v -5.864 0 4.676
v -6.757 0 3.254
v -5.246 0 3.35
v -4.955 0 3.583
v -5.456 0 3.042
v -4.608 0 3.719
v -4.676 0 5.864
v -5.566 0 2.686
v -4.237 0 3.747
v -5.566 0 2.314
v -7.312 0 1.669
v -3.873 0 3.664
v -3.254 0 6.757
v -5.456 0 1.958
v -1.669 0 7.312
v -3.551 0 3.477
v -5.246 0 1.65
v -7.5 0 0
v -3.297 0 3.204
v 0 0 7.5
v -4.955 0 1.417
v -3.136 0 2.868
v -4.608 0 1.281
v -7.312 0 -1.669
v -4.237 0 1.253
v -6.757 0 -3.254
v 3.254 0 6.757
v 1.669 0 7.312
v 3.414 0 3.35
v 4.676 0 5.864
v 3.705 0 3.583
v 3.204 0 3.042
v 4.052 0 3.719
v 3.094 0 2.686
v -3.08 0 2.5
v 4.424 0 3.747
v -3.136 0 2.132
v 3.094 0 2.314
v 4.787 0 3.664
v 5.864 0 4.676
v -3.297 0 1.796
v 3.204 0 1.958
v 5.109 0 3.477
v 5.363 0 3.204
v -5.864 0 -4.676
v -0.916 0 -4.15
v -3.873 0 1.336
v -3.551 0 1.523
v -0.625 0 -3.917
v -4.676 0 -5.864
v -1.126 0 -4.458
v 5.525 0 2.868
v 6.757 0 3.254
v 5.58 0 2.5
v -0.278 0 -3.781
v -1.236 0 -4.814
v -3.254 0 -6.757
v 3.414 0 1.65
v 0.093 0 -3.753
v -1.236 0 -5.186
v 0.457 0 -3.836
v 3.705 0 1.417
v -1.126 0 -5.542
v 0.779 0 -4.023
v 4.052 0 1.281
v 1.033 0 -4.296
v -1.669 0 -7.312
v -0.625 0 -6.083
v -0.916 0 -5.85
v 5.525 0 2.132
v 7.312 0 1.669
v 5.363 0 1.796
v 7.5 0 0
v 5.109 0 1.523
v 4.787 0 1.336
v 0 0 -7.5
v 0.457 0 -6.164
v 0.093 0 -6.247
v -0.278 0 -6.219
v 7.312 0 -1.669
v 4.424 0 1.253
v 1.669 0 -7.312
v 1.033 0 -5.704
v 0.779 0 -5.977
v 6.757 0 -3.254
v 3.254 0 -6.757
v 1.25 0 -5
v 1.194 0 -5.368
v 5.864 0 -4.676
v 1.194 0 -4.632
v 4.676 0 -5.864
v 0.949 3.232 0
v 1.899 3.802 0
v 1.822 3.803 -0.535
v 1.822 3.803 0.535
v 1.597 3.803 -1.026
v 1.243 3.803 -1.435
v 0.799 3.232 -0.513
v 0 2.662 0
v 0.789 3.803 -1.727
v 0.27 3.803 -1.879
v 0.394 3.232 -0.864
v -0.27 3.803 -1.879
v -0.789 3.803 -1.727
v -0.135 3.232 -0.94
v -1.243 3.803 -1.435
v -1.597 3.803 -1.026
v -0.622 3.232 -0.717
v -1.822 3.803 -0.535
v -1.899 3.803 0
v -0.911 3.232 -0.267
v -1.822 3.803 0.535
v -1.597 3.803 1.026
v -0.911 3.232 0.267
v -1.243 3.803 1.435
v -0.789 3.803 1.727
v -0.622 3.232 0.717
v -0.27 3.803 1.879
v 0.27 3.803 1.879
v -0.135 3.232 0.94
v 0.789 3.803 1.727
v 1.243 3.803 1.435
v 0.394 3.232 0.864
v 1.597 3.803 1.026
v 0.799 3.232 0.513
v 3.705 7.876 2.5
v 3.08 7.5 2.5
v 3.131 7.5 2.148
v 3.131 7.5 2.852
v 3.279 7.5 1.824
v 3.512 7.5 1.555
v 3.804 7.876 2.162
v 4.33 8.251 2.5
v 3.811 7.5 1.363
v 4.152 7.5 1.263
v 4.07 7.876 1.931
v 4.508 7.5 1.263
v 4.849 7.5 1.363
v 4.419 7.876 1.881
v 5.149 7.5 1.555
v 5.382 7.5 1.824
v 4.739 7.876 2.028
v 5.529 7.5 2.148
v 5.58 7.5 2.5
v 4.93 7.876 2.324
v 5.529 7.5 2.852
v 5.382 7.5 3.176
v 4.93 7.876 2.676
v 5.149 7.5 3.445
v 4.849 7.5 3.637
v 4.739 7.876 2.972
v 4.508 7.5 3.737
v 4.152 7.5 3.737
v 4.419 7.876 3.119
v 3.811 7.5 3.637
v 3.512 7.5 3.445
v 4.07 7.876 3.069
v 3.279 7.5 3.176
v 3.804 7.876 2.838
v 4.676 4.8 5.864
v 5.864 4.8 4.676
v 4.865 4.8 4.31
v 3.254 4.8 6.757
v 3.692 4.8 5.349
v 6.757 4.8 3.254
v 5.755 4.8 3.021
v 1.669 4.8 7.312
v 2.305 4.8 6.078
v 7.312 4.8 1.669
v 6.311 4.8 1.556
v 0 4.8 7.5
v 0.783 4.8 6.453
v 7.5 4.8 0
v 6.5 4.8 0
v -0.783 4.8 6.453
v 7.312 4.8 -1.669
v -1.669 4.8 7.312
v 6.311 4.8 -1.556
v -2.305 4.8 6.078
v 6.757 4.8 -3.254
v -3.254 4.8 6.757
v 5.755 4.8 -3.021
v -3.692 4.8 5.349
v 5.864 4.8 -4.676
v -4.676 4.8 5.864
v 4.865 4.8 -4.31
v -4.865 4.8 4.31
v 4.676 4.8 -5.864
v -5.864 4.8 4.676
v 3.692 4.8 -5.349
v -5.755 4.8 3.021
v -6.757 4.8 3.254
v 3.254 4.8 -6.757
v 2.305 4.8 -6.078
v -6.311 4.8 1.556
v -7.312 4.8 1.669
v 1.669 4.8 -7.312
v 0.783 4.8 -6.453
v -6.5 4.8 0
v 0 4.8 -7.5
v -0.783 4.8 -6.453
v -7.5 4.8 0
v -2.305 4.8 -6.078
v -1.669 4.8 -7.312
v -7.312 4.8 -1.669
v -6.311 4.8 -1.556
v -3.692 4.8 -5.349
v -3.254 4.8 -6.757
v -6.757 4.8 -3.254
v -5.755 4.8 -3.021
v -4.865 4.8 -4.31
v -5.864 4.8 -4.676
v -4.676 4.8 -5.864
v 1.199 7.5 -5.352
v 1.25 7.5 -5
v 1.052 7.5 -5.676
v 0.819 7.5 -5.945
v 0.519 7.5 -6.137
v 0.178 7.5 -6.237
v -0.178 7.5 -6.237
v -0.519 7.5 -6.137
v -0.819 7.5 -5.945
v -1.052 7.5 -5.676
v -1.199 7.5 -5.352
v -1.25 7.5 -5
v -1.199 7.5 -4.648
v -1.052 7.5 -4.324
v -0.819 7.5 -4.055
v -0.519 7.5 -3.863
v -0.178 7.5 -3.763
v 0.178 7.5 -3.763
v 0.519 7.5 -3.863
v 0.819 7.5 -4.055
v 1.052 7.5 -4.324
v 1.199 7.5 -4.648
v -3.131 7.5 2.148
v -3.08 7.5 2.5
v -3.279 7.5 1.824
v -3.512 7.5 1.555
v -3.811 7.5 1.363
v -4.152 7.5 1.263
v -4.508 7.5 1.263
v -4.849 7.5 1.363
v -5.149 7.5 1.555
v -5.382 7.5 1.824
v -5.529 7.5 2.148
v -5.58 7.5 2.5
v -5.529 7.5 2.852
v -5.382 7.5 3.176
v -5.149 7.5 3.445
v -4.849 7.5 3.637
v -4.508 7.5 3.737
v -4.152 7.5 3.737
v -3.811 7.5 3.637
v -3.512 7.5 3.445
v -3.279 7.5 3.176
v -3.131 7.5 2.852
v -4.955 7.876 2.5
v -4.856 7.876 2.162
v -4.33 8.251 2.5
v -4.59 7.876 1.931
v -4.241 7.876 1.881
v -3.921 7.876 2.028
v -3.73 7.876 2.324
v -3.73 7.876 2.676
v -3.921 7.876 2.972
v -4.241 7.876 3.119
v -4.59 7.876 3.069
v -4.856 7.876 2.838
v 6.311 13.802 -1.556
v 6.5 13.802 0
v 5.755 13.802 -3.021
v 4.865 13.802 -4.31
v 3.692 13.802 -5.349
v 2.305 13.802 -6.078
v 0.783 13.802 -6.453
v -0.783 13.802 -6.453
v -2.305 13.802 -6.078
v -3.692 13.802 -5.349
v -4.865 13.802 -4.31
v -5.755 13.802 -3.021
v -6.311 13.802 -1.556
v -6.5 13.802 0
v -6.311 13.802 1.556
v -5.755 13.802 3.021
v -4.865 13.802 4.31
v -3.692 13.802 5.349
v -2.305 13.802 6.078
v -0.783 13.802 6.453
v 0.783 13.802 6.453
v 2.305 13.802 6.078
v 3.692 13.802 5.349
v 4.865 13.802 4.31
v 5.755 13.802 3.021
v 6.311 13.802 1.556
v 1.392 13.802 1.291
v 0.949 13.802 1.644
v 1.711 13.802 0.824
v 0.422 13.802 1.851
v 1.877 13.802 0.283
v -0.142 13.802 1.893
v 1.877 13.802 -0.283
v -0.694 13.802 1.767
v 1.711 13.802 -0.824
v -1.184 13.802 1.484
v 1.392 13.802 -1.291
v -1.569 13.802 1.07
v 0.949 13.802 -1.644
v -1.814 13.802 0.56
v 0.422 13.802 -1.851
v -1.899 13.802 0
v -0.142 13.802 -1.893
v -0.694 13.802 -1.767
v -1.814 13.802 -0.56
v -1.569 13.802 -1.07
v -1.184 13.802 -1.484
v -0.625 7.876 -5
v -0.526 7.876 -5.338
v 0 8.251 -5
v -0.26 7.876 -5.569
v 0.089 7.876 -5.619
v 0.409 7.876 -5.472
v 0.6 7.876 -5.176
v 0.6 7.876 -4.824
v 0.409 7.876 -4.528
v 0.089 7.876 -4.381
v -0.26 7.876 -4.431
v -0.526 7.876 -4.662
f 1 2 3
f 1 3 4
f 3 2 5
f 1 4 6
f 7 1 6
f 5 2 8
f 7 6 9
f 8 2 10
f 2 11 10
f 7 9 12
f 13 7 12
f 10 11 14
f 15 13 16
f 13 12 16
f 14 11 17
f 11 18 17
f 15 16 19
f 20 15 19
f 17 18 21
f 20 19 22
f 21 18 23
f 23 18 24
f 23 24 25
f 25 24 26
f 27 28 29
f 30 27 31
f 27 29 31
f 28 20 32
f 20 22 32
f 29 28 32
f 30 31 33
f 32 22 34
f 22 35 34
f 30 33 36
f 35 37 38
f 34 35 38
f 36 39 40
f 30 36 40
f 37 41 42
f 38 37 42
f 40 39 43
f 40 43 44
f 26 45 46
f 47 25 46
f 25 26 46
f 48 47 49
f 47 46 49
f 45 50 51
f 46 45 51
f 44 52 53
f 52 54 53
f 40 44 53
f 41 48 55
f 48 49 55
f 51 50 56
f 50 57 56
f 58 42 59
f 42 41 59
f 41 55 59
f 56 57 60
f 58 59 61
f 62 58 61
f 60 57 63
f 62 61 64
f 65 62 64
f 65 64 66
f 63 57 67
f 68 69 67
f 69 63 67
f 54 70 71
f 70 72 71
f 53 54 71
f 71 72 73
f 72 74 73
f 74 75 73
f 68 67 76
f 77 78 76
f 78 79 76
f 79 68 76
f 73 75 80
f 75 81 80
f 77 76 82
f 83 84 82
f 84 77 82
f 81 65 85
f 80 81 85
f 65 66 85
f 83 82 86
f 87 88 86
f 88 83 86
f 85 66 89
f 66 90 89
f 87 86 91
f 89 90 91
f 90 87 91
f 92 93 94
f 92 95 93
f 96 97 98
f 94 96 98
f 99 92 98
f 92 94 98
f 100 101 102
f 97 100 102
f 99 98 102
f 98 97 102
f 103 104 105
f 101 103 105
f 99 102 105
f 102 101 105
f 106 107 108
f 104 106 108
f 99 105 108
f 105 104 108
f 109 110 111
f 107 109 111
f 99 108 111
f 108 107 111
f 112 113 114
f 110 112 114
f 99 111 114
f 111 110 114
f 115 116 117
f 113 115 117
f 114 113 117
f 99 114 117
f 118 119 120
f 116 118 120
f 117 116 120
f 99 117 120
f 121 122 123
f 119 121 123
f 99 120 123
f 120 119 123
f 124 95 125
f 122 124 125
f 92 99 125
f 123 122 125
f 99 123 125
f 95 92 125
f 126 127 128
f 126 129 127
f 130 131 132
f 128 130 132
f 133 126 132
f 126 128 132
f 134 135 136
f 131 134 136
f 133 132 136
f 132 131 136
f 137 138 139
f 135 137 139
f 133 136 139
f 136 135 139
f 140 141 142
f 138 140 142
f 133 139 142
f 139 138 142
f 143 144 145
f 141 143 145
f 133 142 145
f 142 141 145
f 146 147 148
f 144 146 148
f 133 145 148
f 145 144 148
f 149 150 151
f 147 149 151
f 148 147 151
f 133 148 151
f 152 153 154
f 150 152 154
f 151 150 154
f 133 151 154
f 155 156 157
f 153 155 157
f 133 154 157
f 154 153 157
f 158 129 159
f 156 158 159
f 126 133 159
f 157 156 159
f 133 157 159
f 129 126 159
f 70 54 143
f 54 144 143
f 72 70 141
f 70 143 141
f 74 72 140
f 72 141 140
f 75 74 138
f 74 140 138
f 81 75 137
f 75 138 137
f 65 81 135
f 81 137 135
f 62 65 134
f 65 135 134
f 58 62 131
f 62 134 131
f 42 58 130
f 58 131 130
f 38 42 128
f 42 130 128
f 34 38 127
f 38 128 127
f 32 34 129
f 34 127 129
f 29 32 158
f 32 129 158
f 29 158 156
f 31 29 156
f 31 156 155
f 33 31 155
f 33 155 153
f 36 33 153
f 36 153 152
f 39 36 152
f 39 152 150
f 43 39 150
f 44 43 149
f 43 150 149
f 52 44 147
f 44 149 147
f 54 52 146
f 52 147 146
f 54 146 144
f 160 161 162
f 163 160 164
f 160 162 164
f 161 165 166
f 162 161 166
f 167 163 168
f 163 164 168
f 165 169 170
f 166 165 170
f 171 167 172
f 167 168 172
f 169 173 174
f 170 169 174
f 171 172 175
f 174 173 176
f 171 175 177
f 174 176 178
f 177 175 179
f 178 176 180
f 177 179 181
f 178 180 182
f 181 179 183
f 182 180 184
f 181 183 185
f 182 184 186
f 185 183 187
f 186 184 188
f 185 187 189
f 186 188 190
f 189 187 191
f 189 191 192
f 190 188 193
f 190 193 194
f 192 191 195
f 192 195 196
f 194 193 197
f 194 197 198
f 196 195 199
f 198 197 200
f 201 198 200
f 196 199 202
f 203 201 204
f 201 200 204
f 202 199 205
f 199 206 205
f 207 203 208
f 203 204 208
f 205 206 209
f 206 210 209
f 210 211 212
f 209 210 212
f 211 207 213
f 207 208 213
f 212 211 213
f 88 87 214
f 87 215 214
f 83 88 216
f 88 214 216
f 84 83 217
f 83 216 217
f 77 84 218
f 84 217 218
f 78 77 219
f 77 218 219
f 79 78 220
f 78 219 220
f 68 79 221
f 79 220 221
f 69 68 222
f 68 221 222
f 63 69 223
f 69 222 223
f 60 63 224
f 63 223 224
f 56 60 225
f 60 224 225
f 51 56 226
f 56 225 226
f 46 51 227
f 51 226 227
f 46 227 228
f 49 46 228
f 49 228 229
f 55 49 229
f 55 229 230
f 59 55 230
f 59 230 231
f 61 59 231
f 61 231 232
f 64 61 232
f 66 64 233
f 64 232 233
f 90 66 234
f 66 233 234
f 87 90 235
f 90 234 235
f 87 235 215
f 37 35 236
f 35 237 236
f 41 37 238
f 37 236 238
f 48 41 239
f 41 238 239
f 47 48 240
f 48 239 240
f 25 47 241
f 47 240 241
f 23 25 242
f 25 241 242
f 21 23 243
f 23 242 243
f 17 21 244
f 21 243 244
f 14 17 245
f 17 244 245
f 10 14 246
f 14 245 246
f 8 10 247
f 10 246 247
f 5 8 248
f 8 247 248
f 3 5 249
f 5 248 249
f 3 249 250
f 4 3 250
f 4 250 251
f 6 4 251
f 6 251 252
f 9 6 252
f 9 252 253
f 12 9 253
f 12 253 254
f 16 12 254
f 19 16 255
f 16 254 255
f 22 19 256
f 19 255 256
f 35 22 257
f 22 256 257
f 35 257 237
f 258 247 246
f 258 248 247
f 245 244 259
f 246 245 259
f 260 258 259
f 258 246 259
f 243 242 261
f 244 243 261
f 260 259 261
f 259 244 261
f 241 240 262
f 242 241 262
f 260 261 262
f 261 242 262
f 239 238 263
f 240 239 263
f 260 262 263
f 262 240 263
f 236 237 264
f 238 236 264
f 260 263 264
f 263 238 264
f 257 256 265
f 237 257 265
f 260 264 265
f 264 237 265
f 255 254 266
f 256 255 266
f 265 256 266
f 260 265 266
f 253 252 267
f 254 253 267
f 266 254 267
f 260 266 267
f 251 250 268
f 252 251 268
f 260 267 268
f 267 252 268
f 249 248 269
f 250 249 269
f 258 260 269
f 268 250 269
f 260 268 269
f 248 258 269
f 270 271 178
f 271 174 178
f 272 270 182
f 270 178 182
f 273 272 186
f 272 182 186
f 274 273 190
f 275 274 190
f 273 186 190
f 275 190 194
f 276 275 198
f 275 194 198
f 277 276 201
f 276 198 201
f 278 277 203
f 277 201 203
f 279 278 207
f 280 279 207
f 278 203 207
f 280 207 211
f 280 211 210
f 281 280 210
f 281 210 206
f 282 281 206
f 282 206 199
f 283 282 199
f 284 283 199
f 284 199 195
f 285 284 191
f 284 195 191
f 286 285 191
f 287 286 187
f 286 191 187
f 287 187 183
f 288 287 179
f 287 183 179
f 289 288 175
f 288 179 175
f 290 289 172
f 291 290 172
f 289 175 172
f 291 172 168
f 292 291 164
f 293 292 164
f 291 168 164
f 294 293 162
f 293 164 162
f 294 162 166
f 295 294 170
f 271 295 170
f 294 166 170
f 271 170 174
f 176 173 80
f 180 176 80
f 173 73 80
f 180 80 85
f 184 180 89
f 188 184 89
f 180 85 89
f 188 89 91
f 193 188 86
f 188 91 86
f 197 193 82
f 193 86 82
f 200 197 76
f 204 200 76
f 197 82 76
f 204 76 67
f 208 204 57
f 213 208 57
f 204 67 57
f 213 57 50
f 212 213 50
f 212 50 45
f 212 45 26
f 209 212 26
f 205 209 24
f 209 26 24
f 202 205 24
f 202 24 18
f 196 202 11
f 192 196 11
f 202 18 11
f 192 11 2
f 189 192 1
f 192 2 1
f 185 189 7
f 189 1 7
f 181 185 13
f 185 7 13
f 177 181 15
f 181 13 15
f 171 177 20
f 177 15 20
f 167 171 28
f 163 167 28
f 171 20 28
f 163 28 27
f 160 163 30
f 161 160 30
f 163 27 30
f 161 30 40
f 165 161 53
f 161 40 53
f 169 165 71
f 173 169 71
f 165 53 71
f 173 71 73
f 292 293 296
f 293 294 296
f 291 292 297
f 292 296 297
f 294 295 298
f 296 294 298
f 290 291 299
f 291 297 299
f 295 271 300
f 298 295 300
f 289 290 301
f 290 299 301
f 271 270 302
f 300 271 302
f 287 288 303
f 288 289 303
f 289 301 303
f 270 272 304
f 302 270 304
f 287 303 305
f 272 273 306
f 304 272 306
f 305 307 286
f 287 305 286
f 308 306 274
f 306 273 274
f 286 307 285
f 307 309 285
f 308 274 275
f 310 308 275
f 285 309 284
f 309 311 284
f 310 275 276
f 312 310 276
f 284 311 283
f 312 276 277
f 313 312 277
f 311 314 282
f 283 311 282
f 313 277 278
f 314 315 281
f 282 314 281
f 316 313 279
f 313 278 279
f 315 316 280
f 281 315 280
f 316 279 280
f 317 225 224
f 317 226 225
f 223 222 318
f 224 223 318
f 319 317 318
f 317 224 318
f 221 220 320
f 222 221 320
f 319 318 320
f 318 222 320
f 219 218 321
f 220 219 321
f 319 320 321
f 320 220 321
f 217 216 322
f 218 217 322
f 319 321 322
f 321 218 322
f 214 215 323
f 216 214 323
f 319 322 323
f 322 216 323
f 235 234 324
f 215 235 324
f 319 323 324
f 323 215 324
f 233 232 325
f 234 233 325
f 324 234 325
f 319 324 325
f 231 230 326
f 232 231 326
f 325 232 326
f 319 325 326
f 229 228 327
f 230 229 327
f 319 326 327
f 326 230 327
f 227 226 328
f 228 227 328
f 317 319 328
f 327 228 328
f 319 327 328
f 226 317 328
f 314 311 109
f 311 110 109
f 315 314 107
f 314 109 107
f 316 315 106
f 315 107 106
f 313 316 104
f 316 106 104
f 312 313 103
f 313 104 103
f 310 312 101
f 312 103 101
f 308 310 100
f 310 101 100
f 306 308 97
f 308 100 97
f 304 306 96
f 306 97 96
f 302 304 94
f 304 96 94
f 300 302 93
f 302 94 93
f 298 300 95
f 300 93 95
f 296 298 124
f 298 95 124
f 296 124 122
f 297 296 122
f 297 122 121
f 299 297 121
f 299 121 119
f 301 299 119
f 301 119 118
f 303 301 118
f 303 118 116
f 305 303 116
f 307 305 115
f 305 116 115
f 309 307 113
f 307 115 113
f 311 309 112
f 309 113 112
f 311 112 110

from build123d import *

# Parameters (mm, degrees)
M3X0_5_TAPPED_HOLE1_D      = 2.5
M3X0_5_TAPPED_HOLE1_DEPTH  = 7.5
M3X0_5_TAPPED_HOLE1_TIP    = 0.751075774
F_10_24_TAPPED_HOLE1_D     = 3.7973
F_10_24_TAPPED_HOLE1_DEPTH = 10
F_10_24_TAPPED_HOLE1_TIP   = 1.140824014


with BuildPart() as part:
    # Sketch1 → Revolve1 (revolve)
    with BuildSketch(Plane.XY):
        Polygon((0, 13.8025), (6.5, 13.8025), (6.5, 4.8), (7.5, 4.8), (7.5, 0), (0, 0), align=None)
    revolve(axis=Axis((0, 0, 0), (0, 1, 0)))

    # M3x0.5 Tapped Hole1
    with Locations(Plane(origin=(0, 0, 0), x_dir=(-1, 0, 0), z_dir=(0, -1, 0))):
        with Locations((0, 5), (4.330127019, -2.5), (-4.330127019, -2.5)):
            Hole(M3X0_5_TAPPED_HOLE1_D / 2, depth=M3X0_5_TAPPED_HOLE1_DEPTH)
            with Locations((0, 0, -(M3X0_5_TAPPED_HOLE1_DEPTH + M3X0_5_TAPPED_HOLE1_TIP / 2))):  # 118° drill point
                Cone(0, M3X0_5_TAPPED_HOLE1_D / 2, M3X0_5_TAPPED_HOLE1_TIP, mode=Mode.SUBTRACT)

    # #10-24 Tapped Hole1
    with Locations(Plane(origin=(0, 13.8025, 0), x_dir=(1, 0, 0), z_dir=(0, 1, 0))):
        with Locations((0, 0)):
            Hole(F_10_24_TAPPED_HOLE1_D / 2, depth=F_10_24_TAPPED_HOLE1_DEPTH)
            with Locations((0, 0, -(F_10_24_TAPPED_HOLE1_DEPTH + F_10_24_TAPPED_HOLE1_TIP / 2))):  # 118° drill point
                Cone(0, F_10_24_TAPPED_HOLE1_D / 2, F_10_24_TAPPED_HOLE1_TIP, mode=Mode.SUBTRACT)


solid = part.part
